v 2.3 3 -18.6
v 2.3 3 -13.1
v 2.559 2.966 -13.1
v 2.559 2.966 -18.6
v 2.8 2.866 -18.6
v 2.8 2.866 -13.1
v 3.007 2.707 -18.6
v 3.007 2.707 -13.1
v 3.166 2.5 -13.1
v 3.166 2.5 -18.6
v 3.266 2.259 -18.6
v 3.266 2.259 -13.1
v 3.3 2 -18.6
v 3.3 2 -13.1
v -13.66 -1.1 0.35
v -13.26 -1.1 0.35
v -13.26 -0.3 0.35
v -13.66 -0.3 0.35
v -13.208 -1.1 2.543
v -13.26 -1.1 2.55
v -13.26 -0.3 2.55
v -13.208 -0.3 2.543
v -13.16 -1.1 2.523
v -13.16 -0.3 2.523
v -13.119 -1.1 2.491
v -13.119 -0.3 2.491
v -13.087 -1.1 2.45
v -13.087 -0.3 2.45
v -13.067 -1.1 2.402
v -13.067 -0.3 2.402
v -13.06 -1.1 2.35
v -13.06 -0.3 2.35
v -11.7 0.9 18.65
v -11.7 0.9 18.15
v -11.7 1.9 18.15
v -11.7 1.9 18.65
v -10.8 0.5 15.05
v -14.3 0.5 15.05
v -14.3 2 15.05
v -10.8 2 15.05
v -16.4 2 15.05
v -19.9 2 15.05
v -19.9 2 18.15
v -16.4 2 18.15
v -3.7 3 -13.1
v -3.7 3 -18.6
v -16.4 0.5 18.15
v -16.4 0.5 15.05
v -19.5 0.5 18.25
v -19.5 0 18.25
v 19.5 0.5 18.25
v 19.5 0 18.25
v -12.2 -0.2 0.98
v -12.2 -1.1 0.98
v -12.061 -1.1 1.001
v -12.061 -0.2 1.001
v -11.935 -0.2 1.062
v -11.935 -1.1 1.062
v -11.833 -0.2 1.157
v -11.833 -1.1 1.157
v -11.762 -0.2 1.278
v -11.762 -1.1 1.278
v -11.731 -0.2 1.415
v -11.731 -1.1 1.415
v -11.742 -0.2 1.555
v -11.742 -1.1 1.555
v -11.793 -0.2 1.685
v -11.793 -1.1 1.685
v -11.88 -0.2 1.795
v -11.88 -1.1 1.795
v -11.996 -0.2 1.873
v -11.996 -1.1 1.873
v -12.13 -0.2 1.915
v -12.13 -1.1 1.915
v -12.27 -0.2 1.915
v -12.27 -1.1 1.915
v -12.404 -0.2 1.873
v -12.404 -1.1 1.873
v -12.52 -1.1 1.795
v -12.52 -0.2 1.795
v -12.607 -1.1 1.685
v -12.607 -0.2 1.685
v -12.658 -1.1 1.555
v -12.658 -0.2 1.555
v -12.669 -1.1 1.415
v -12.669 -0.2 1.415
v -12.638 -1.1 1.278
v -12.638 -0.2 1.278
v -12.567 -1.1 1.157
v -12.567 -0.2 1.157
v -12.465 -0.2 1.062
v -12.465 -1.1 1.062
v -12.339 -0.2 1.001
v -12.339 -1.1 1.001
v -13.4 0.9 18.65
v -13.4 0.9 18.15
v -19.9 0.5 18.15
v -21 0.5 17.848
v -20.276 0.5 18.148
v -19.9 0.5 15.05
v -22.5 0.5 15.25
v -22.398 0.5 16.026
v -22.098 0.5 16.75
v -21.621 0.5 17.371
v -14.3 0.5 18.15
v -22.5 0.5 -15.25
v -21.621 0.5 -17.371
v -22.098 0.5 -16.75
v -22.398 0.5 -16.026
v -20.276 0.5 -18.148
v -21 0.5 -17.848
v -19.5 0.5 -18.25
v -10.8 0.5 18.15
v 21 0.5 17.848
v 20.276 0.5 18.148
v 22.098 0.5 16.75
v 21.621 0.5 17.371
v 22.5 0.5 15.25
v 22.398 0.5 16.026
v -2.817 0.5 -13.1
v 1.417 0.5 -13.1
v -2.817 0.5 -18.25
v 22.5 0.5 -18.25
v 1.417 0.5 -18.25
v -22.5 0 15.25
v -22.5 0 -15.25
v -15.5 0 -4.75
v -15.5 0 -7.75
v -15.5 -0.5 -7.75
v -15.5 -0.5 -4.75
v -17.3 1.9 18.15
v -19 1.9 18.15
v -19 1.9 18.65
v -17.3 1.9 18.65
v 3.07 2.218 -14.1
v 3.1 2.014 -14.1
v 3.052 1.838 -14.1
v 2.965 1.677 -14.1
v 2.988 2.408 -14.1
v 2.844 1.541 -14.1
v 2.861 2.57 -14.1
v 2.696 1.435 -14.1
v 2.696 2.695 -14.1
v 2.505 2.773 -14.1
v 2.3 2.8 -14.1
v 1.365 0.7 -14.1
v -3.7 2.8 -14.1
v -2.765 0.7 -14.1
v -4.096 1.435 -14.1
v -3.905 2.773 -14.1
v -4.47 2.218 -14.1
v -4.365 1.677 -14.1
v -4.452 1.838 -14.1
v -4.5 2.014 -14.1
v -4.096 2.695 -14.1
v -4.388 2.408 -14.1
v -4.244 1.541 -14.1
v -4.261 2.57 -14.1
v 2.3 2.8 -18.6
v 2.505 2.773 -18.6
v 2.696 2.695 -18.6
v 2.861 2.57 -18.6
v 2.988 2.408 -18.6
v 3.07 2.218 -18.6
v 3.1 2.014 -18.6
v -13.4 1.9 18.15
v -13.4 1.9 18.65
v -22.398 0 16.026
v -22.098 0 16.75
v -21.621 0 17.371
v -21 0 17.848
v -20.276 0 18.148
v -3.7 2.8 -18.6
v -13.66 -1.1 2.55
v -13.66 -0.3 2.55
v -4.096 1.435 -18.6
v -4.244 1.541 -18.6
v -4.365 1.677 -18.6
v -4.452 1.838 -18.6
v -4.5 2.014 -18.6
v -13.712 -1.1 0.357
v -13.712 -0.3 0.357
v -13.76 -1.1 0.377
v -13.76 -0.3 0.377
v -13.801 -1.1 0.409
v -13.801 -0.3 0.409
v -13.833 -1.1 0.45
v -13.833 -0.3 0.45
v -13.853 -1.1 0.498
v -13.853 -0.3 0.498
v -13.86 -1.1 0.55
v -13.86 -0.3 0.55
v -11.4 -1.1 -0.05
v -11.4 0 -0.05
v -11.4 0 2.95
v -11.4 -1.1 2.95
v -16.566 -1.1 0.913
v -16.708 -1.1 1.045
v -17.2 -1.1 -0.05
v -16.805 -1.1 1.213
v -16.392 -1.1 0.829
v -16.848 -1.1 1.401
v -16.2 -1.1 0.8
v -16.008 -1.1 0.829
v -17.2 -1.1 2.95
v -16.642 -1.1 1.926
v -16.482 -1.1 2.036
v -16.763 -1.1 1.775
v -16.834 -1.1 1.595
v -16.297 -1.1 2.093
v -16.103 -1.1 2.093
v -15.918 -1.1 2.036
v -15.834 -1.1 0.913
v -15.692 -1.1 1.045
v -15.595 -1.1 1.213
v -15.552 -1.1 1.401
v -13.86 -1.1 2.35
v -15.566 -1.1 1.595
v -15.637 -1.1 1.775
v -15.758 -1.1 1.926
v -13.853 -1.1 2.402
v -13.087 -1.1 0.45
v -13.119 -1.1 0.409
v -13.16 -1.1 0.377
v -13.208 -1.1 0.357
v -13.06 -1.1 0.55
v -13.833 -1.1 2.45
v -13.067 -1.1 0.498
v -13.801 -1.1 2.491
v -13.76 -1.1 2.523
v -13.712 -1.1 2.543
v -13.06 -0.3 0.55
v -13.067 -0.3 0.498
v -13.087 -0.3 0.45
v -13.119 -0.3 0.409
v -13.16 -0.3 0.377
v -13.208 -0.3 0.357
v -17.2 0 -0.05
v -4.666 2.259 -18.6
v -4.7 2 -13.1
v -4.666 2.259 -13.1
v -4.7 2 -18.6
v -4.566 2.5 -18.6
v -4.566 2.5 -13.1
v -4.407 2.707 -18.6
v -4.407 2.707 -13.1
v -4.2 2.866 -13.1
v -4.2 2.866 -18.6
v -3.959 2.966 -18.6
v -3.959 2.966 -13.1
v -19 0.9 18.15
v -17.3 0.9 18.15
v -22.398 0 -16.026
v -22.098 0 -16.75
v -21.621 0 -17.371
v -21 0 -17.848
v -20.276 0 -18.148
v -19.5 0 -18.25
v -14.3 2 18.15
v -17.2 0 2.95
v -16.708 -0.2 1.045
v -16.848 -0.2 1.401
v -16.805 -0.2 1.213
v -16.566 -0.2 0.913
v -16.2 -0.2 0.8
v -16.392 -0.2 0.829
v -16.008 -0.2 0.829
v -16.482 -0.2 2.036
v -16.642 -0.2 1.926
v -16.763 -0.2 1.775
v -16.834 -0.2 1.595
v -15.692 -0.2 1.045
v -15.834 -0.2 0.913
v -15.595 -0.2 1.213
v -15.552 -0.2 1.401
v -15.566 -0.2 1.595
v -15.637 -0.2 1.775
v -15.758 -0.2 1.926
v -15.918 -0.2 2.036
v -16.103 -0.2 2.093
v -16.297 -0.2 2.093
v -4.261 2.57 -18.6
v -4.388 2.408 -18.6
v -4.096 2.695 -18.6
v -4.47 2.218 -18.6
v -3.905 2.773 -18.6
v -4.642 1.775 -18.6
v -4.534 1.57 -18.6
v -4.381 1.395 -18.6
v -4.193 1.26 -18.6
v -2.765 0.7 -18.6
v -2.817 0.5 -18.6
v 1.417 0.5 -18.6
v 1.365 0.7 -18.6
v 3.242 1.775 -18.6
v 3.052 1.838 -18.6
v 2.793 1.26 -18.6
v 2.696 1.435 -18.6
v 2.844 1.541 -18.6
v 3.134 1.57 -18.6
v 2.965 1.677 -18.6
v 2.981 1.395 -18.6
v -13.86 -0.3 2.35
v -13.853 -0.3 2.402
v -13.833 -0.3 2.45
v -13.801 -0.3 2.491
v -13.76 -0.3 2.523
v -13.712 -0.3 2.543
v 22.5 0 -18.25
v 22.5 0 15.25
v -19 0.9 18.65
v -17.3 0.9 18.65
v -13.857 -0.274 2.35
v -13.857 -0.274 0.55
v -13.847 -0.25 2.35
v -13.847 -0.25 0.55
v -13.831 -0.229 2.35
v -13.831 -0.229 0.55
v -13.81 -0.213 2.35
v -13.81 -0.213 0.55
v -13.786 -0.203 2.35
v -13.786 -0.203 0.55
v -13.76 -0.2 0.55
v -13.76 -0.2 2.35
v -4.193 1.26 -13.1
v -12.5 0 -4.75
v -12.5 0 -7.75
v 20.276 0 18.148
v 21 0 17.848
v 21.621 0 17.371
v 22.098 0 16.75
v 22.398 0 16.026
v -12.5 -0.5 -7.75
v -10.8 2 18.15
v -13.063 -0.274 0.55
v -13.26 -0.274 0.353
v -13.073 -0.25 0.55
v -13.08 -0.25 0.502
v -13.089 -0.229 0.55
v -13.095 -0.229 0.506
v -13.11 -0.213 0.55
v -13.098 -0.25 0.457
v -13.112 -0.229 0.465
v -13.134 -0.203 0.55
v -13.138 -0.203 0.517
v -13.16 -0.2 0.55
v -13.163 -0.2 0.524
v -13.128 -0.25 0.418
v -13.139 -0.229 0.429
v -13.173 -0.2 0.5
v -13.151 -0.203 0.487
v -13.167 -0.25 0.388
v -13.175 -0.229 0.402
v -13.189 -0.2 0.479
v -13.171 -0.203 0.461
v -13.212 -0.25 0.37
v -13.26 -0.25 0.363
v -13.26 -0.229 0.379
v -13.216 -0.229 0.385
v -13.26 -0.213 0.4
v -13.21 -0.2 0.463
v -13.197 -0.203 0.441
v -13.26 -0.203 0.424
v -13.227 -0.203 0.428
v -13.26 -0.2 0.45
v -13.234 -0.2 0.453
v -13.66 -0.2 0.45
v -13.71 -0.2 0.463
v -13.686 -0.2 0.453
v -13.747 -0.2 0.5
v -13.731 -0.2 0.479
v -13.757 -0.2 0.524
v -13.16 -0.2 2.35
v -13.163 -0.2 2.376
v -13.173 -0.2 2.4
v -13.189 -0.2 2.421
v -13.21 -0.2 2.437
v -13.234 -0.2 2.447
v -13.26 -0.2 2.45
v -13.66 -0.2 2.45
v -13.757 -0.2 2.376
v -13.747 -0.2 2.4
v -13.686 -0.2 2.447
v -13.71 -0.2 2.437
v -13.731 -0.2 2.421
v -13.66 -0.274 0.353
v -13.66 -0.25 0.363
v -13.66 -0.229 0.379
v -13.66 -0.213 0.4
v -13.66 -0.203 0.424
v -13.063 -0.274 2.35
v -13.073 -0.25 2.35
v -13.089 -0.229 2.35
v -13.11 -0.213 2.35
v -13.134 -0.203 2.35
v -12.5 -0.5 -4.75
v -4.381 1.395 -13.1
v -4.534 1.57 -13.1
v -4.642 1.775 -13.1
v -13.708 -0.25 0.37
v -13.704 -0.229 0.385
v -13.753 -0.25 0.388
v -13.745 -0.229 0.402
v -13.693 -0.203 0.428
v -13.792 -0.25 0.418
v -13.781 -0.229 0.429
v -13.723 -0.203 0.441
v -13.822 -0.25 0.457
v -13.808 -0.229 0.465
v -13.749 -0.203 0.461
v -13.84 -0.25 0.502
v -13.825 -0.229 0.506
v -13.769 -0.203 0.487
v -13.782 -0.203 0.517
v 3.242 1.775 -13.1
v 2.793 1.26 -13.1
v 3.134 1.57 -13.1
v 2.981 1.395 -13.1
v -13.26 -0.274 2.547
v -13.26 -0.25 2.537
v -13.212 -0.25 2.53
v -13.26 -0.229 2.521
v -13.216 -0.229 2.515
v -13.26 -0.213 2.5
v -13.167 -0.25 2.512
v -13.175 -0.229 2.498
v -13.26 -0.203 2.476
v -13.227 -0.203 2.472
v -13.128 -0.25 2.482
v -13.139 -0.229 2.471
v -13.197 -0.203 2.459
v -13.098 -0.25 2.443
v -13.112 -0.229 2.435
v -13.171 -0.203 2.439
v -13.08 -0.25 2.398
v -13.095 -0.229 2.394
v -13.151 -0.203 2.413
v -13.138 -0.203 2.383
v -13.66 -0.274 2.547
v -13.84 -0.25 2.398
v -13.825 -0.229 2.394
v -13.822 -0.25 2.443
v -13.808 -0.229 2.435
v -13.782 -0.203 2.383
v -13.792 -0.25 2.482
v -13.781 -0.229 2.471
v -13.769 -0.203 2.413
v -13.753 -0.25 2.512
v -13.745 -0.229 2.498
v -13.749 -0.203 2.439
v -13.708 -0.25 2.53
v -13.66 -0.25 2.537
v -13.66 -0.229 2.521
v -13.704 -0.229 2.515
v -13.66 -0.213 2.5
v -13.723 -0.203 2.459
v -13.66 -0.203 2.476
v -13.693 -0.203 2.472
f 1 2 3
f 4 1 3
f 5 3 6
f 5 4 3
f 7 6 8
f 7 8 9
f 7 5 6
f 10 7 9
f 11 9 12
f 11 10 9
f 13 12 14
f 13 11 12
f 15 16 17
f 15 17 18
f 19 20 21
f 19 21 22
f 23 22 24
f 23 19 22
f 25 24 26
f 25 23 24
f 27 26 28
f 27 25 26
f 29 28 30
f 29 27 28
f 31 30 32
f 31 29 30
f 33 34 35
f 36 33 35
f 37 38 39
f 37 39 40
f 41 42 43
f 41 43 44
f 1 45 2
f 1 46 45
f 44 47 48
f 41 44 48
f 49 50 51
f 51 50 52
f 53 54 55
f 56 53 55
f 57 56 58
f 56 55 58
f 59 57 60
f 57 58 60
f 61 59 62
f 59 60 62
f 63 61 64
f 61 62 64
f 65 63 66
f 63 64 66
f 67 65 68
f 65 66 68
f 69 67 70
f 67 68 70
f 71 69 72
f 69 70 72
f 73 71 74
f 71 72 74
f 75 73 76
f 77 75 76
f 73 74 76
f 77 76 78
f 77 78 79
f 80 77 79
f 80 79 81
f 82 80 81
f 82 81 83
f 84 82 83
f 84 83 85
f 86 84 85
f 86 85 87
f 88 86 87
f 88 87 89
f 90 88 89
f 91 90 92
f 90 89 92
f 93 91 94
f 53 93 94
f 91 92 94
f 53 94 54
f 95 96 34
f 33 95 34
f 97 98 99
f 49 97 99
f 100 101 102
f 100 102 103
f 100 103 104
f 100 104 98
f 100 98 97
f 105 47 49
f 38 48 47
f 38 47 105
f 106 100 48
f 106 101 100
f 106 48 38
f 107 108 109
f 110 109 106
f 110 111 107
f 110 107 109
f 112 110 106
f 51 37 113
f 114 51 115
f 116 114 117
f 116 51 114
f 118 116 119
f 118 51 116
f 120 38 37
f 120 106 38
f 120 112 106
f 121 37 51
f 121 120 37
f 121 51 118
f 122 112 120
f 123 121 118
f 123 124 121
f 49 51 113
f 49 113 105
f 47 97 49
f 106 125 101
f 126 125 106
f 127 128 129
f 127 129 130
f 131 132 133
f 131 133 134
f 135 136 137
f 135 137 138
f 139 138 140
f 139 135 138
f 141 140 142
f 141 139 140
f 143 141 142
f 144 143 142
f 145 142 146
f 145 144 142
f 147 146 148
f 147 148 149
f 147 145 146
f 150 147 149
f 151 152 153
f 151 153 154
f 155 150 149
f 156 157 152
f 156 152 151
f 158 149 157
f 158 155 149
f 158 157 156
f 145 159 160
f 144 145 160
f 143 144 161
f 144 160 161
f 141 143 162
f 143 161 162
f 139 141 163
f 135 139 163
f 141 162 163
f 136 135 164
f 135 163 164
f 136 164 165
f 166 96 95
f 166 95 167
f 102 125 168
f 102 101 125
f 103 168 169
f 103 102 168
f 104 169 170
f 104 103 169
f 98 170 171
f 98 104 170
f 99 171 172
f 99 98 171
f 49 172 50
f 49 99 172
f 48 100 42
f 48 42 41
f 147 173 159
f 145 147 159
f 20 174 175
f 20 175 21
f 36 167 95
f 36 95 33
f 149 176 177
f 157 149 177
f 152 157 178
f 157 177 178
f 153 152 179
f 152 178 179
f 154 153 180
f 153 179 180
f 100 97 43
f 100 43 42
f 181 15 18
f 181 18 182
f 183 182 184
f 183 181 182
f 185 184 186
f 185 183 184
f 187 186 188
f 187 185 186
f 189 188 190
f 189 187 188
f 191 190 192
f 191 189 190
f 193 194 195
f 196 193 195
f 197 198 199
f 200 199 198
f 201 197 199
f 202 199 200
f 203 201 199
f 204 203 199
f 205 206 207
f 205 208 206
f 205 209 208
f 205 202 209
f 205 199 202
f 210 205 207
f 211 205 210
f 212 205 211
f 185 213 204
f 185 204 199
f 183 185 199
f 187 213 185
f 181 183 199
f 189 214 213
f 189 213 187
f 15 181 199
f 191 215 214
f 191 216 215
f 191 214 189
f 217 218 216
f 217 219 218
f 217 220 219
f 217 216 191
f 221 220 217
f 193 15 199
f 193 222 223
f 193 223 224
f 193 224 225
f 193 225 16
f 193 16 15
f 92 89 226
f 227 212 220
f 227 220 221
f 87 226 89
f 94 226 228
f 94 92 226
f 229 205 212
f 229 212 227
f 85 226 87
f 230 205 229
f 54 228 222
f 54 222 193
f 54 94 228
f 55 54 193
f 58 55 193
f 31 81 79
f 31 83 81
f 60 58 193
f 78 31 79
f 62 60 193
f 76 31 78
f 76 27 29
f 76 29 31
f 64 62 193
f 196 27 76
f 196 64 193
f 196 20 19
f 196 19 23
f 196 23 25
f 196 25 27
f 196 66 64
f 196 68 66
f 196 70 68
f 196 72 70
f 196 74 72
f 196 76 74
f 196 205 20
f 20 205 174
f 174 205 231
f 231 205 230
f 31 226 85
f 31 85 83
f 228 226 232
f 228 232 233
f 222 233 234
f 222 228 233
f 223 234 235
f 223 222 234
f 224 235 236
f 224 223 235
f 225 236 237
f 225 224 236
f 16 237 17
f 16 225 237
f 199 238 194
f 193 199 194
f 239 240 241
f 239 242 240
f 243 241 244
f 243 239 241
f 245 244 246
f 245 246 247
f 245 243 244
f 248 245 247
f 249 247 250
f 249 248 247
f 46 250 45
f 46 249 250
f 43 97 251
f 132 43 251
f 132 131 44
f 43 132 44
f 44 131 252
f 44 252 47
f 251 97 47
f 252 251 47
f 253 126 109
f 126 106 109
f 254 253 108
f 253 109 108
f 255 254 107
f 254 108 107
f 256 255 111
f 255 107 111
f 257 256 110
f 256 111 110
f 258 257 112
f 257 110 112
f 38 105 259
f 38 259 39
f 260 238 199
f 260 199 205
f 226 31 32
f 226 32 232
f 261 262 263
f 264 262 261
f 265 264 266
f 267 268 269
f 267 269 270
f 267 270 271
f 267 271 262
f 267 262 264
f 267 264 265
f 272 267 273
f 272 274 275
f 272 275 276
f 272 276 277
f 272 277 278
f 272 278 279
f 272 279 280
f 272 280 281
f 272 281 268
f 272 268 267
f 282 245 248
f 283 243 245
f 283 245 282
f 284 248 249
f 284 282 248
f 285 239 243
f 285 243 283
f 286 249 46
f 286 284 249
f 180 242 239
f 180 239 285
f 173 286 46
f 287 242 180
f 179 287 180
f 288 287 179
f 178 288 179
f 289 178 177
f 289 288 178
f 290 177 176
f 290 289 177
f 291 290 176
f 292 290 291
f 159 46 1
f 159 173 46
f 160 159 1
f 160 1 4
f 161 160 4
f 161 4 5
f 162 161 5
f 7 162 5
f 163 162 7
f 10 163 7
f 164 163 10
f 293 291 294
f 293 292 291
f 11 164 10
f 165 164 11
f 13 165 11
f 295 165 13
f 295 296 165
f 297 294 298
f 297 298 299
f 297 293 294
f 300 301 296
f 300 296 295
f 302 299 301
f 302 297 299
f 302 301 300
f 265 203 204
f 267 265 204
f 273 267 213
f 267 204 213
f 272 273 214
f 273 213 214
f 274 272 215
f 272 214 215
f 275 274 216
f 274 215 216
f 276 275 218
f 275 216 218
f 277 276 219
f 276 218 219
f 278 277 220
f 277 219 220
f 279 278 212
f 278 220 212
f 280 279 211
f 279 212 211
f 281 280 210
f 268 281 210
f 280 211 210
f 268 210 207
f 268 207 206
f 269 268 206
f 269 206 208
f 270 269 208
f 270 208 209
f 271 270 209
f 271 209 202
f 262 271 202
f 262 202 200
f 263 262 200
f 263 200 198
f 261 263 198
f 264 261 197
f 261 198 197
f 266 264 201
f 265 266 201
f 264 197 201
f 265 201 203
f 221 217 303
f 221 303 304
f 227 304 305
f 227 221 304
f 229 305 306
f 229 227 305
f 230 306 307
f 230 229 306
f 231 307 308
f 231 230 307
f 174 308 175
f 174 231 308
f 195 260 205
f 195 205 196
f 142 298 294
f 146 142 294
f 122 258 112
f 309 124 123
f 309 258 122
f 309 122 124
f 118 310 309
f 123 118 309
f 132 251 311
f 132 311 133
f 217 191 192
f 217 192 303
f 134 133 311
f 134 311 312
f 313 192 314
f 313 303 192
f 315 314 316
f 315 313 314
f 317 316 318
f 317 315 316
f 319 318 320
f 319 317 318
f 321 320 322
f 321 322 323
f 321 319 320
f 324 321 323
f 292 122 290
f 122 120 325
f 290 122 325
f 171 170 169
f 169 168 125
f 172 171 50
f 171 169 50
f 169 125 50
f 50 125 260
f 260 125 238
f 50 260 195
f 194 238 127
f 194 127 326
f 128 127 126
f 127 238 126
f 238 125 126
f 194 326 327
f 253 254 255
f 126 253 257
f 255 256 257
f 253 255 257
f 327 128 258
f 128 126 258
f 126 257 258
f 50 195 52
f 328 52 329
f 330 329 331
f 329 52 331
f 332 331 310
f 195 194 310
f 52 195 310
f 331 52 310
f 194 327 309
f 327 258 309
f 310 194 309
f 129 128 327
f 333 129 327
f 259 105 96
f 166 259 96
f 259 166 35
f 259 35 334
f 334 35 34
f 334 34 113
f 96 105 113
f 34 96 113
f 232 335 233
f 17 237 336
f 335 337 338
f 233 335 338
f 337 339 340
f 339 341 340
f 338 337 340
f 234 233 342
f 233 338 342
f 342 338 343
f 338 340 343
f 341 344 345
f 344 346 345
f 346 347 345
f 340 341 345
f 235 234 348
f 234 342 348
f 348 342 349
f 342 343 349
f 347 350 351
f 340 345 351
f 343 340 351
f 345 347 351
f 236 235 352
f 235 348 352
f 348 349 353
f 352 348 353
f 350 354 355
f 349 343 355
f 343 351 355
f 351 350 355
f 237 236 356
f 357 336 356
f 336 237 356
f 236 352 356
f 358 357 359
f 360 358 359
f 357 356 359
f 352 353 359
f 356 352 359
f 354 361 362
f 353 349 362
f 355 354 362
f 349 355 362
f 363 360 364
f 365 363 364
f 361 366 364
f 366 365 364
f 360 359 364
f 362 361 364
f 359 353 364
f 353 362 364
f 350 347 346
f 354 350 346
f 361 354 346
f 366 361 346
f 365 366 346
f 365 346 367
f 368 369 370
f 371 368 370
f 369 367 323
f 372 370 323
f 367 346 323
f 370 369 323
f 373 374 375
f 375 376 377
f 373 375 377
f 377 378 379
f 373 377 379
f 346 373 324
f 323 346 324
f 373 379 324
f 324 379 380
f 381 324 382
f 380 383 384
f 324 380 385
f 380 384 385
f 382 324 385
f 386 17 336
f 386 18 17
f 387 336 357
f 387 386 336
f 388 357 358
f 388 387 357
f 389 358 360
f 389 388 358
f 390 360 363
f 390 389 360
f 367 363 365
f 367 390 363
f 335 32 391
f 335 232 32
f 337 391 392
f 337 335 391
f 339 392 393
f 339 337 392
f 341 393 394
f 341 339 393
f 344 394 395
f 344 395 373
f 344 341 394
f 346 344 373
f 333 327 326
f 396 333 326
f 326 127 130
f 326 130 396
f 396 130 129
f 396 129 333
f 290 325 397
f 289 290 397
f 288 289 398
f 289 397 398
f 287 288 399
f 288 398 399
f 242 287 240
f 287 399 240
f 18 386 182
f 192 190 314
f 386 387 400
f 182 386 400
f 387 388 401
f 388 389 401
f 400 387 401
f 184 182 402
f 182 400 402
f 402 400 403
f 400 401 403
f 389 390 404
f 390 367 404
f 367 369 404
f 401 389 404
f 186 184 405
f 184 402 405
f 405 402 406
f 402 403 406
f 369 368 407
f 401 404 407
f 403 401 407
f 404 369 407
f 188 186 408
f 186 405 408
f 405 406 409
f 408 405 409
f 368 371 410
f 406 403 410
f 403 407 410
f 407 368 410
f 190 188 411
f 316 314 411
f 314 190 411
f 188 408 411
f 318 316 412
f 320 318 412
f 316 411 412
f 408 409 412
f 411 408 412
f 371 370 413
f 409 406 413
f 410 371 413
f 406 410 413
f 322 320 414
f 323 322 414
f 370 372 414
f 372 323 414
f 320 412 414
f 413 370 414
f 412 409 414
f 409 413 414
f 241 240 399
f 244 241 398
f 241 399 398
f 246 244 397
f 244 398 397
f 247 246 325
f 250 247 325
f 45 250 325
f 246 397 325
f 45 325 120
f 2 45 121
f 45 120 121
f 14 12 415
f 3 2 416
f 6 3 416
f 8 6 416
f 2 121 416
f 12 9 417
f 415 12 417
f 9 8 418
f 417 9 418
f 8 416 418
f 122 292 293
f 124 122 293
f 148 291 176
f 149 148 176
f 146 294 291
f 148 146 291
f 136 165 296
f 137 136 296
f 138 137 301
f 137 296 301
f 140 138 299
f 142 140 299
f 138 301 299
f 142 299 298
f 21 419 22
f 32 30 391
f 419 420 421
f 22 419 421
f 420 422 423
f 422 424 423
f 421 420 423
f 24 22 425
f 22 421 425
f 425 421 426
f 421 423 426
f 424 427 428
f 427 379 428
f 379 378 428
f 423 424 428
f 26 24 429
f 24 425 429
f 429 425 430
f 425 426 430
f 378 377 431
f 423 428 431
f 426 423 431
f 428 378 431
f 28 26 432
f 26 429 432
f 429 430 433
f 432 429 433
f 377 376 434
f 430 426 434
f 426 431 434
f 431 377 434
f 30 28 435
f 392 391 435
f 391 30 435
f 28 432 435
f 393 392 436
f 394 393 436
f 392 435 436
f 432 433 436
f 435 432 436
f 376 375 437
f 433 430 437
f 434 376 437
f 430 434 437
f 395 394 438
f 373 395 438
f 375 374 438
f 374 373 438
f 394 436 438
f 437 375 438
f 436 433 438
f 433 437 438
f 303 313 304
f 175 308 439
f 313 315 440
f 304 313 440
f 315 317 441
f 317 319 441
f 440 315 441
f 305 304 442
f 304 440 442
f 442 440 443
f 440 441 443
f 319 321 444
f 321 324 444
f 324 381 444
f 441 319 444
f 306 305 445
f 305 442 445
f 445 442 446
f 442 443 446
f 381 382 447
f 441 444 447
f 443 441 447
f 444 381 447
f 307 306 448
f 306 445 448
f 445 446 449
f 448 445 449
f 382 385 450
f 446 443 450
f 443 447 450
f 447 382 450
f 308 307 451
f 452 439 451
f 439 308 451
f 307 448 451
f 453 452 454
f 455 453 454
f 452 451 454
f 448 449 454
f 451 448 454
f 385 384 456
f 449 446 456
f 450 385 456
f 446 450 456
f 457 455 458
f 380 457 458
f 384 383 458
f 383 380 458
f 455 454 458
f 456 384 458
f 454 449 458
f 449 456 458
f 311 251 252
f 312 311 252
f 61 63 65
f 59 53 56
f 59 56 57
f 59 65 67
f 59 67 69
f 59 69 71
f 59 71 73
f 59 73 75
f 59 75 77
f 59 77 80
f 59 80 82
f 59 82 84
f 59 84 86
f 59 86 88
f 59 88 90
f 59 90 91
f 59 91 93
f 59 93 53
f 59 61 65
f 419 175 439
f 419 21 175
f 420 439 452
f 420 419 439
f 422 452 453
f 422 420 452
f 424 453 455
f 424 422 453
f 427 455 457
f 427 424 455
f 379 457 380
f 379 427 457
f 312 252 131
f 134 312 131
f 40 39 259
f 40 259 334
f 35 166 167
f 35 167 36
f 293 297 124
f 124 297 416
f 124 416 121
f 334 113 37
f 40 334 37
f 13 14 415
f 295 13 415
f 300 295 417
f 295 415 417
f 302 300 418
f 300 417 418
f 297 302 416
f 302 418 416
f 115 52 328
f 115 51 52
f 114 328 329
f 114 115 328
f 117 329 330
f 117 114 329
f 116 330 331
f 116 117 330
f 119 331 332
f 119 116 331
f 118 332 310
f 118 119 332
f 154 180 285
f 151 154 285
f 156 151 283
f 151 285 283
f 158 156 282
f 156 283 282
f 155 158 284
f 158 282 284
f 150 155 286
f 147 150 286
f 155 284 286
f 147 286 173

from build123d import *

# Parameters (mm, degrees)
SKETCH_1_W          = 45
SKETCH_1_H          = 36.5
EXTRUDE_1_DEPTH     = 0.5
FILLET_1_R          = 3
SKETCH_2_W          = 5.8
SKETCH_2_H          = 3
EXTRUDE_2_DEPTH     = 1.1
SKETCH_3_R          = 0.65
SKETCH_3_R_2        = 0.47
CUT_EXTRUDE_1_DEPTH = 0.9
FILLET_2_R          = 0.1
SKETCH_4_W          = 3
SKETCH_4_H          = 3
EXTRUDE_3_DEPTH     = 0.5
SKETCH_5_W          = 8
SKETCH_5_H          = 5.5
EXTRUDE_4_DEPTH     = 2.5
FILLET_3_R          = 1
CUT_EXTRUDE_2_DEPTH = 39.704941545
FILLET_4_R          = 1
CUT_EXTRUDE_3_DEPTH = 4.5
SKETCH_9_W          = 3.5
SKETCH_9_H          = 3.1
EXTRUDE_5_DEPTH     = 1.5
SKETCH_10_W         = 1.7
SKETCH_10_H         = 1
EXTRUDE_6_DEPTH     = 0.5


with BuildPart() as part:
    # Эскиз1 → Бобышка-Вытянуть1 (new body)
    with BuildSketch(Plane(origin=(0, 0, 0), x_dir=(1, 0, 0), z_dir=(0, 1, 0))):
        Rectangle(SKETCH_1_W, SKETCH_1_H)
    extrude(amount=EXTRUDE_1_DEPTH)

    # Скругление1
    fillet_1_edges = [part.edges().sort_by_distance(p)[0] for p in [
        (22.5, 0.25, 18.25),
        (-22.5, 0.25, 18.25),
        (-22.5, 0.25, -18.25),
    ]]
    fillet(fillet_1_edges, radius=FILLET_1_R)

    # Эскиз2 → Бобышка-Вытянуть2 (add)
    with BuildSketch(Plane.XZ):
        with Locations((-14.3, 1.45)):
            Rectangle(SKETCH_2_W, SKETCH_2_H)
    extrude(amount=EXTRUDE_2_DEPTH)

    # Эскиз3 → Вырез-Вытянуть1 (cut)
    with BuildSketch(Plane.XZ.offset(1.1)):
        with Locations(Location((-16.2, 1.45, 0), (0, 0, 270))):
            Circle(SKETCH_3_R)
        with Locations(Location((-12.2, 1.45, 0), (0, 0, 270))):
            Circle(SKETCH_3_R_2)
        with BuildLine():
            Line((-13.66, 2.55), (-13.26, 2.55))
            ThreePointArc((-13.26, 2.55), (-13.118578644, 2.491421356), (-13.06, 2.35))
            Line((-13.06, 2.35), (-13.06, 0.55))
            ThreePointArc((-13.06, 0.55), (-13.118578644, 0.408578644), (-13.26, 0.35))
            Line((-13.26, 0.35), (-13.66, 0.35))
            ThreePointArc((-13.66, 0.35), (-13.801421356, 0.408578644), (-13.86, 0.55))
            Line((-13.86, 0.55), (-13.86, 2.35))
            ThreePointArc((-13.86, 2.35), (-13.801421356, 2.491421356), (-13.66, 2.55))
        make_face()
    extrude(amount=-CUT_EXTRUDE_1_DEPTH, mode=Mode.SUBTRACT)

    # Скругление2
    fillet_2_edges = [part.edges().sort_by_distance(p)[0] for p in [
        (-13.801421356, -0.2, 0.408578644),
        (-13.86, -0.2, 1.45),
        (-13.801421356, -0.2, 2.491421356),
        (-13.46, -0.2, 2.55),
        (-13.118578644, -0.2, 2.491421356),
        (-13.06, -0.2, 1.45),
        (-13.118578644, -0.2, 0.408578644),
        (-13.46, -0.2, 0.35),
    ]]
    fillet(fillet_2_edges, radius=FILLET_2_R)

    # Эскиз4 → Бобышка-Вытянуть3 (add)
    with BuildSketch(Plane.XZ):
        with Locations((-14, -6.25)):
            Rectangle(SKETCH_4_W, SKETCH_4_H)
    extrude(amount=EXTRUDE_3_DEPTH)

    # Эскиз5 → Бобышка-Вытянуть4 (add)
    with BuildSketch(Plane(origin=(0, 0.5, 0), x_dir=(1, 0, 0), z_dir=(0, 1, 0))):
        with Locations((-0.7, 15.85)):
            Rectangle(SKETCH_5_W, SKETCH_5_H)
    extrude(amount=EXTRUDE_4_DEPTH)

    # Скругление3
    fillet_3_edges = [part.edges().sort_by_distance(p)[0] for p in [
        (3.3, 3, -15.85),
        (-4.7, 3, -15.85),
    ]]
    fillet(fillet_3_edges, radius=FILLET_3_R)

    # Эскиз6 → Вырез-Вытянуть2 (cut, through all)
    with BuildSketch(Plane.XY.offset(-13.1)):
        Polygon((-4.7, 0.5), (-2.816810686, 0.5), (-4.7, 1.540058106), align=None)
        Polygon((3.3, 1.540058106), (1.416810686, 0.5), (3.3, 0.5), align=None)
    extrude(amount=-CUT_EXTRUDE_2_DEPTH, mode=Mode.SUBTRACT)

    # Скругление4
    # the kernel refuses this fillet: 1 mm, written as the material it takes off along each edge
    with BuildSketch(Plane(origin=(3.3, 1.540058106, -11.651007536), x_dir=(-0.8753697639222053, -0.48345400651021836, 0), z_dir=(0, 0, -1))) as fillet_4_piece_1:
        with BuildLine():
            CenterArc((0.579596986, 1), FILLET_4_R, 216.682538738, 53.317461262)
            Line((-0.222360751, 0.402619227), (-0.238399906, 0.390671612))
            ThreePointArc((-0.238399906, 0.390671612), (-0.128687771, 0.191640533), (-0.017507395, -0.00966908))
            Line((-0.017507395, -0.00966908), (0, -0.02))
            Line((0, -0.02), (0.579596986, -0.02))
            Line((0.579596986, -0.02), (0.579596986, 0))
        make_face()
    extrude(amount=8.397984929, mode=Mode.SUBTRACT)
    with BuildSketch(Plane(origin=(-4.7, 1.540058106, -11.651007536), x_dir=(0, 1, 0), z_dir=(0, 0, -1))) as fillet_4_piece_2:
        with BuildLine():
            CenterArc((0.595161279, 0.990815683), FILLET_4_R, 208.911232689, 53.317461262)
            Line((-0.280208485, 0.507361677), (-0.29771588, 0.497692596))
            Line((-0.29771588, 0.497692596), (-0.017507395, -0.00966908))
            Line((-0.017507395, -0.00966908), (0, -0.02))
            ThreePointArc((0, -0.02), (0.229970947, -0.02), (0.457237506, -0.019816314))
            Line((0.457237506, -0.019816314), (0.459941894, 0))
        make_face()
    extrude(amount=8.397984929, mode=Mode.SUBTRACT)

    # Эскиз8 → Вырез-Вытянуть3 (cut)
    with BuildSketch(Plane(origin=(0, 0, -18.6), x_dir=(-1, 0, 0), z_dir=(0, 0, -1))):
        with BuildLine():
            Line((-2.695947522, 1.434923574), (-1.365252427, 0.7))
            Line((-1.365252427, 0.7), (2.765252427, 0.7))
            Line((2.765252427, 0.7), (4.095947522, 1.434923574))
            ThreePointArc((4.095947522, 1.434923574), (4.365171631, 1.677310395), (4.499884525, 2.013592163))
            ThreePointArc((4.499884525, 2.013592163), (4.260859282, 2.57047074), (3.7, 2.8))
            Line((3.7, 2.8), (-2.3, 2.8))
            ThreePointArc((-2.3, 2.8), (-2.860859282, 2.57047074), (-3.099884525, 2.013592163))
            ThreePointArc((-3.099884525, 2.013592163), (-2.965171631, 1.677310395), (-2.695947522, 1.434923574))
        make_face()
    extrude(amount=-CUT_EXTRUDE_3_DEPTH, mode=Mode.SUBTRACT)

    # Эскиз9 → Бобышка-Вытянуть5 (add)
    with BuildSketch(Plane(origin=(0, 0.5, 0), x_dir=(1, 0, 0), z_dir=(0, 1, 0))):
        with Locations((-18.15, -16.6)):
            Rectangle(SKETCH_9_W, SKETCH_9_H)
        with Locations((-12.55, -16.6)):
            Rectangle(SKETCH_9_W, SKETCH_9_H)
    extrude(amount=EXTRUDE_5_DEPTH)

    # Эскиз10 → Бобышка-Вытянуть6 (add)
    with BuildSketch(Plane.XY.offset(18.15)):
        with Locations((-18.15, 1.4)):
            Rectangle(SKETCH_10_W, SKETCH_10_H)
        with Locations((-12.55, 1.4)):
            Rectangle(SKETCH_10_W, SKETCH_10_H)
    extrude(amount=EXTRUDE_6_DEPTH)


solid = part.part
